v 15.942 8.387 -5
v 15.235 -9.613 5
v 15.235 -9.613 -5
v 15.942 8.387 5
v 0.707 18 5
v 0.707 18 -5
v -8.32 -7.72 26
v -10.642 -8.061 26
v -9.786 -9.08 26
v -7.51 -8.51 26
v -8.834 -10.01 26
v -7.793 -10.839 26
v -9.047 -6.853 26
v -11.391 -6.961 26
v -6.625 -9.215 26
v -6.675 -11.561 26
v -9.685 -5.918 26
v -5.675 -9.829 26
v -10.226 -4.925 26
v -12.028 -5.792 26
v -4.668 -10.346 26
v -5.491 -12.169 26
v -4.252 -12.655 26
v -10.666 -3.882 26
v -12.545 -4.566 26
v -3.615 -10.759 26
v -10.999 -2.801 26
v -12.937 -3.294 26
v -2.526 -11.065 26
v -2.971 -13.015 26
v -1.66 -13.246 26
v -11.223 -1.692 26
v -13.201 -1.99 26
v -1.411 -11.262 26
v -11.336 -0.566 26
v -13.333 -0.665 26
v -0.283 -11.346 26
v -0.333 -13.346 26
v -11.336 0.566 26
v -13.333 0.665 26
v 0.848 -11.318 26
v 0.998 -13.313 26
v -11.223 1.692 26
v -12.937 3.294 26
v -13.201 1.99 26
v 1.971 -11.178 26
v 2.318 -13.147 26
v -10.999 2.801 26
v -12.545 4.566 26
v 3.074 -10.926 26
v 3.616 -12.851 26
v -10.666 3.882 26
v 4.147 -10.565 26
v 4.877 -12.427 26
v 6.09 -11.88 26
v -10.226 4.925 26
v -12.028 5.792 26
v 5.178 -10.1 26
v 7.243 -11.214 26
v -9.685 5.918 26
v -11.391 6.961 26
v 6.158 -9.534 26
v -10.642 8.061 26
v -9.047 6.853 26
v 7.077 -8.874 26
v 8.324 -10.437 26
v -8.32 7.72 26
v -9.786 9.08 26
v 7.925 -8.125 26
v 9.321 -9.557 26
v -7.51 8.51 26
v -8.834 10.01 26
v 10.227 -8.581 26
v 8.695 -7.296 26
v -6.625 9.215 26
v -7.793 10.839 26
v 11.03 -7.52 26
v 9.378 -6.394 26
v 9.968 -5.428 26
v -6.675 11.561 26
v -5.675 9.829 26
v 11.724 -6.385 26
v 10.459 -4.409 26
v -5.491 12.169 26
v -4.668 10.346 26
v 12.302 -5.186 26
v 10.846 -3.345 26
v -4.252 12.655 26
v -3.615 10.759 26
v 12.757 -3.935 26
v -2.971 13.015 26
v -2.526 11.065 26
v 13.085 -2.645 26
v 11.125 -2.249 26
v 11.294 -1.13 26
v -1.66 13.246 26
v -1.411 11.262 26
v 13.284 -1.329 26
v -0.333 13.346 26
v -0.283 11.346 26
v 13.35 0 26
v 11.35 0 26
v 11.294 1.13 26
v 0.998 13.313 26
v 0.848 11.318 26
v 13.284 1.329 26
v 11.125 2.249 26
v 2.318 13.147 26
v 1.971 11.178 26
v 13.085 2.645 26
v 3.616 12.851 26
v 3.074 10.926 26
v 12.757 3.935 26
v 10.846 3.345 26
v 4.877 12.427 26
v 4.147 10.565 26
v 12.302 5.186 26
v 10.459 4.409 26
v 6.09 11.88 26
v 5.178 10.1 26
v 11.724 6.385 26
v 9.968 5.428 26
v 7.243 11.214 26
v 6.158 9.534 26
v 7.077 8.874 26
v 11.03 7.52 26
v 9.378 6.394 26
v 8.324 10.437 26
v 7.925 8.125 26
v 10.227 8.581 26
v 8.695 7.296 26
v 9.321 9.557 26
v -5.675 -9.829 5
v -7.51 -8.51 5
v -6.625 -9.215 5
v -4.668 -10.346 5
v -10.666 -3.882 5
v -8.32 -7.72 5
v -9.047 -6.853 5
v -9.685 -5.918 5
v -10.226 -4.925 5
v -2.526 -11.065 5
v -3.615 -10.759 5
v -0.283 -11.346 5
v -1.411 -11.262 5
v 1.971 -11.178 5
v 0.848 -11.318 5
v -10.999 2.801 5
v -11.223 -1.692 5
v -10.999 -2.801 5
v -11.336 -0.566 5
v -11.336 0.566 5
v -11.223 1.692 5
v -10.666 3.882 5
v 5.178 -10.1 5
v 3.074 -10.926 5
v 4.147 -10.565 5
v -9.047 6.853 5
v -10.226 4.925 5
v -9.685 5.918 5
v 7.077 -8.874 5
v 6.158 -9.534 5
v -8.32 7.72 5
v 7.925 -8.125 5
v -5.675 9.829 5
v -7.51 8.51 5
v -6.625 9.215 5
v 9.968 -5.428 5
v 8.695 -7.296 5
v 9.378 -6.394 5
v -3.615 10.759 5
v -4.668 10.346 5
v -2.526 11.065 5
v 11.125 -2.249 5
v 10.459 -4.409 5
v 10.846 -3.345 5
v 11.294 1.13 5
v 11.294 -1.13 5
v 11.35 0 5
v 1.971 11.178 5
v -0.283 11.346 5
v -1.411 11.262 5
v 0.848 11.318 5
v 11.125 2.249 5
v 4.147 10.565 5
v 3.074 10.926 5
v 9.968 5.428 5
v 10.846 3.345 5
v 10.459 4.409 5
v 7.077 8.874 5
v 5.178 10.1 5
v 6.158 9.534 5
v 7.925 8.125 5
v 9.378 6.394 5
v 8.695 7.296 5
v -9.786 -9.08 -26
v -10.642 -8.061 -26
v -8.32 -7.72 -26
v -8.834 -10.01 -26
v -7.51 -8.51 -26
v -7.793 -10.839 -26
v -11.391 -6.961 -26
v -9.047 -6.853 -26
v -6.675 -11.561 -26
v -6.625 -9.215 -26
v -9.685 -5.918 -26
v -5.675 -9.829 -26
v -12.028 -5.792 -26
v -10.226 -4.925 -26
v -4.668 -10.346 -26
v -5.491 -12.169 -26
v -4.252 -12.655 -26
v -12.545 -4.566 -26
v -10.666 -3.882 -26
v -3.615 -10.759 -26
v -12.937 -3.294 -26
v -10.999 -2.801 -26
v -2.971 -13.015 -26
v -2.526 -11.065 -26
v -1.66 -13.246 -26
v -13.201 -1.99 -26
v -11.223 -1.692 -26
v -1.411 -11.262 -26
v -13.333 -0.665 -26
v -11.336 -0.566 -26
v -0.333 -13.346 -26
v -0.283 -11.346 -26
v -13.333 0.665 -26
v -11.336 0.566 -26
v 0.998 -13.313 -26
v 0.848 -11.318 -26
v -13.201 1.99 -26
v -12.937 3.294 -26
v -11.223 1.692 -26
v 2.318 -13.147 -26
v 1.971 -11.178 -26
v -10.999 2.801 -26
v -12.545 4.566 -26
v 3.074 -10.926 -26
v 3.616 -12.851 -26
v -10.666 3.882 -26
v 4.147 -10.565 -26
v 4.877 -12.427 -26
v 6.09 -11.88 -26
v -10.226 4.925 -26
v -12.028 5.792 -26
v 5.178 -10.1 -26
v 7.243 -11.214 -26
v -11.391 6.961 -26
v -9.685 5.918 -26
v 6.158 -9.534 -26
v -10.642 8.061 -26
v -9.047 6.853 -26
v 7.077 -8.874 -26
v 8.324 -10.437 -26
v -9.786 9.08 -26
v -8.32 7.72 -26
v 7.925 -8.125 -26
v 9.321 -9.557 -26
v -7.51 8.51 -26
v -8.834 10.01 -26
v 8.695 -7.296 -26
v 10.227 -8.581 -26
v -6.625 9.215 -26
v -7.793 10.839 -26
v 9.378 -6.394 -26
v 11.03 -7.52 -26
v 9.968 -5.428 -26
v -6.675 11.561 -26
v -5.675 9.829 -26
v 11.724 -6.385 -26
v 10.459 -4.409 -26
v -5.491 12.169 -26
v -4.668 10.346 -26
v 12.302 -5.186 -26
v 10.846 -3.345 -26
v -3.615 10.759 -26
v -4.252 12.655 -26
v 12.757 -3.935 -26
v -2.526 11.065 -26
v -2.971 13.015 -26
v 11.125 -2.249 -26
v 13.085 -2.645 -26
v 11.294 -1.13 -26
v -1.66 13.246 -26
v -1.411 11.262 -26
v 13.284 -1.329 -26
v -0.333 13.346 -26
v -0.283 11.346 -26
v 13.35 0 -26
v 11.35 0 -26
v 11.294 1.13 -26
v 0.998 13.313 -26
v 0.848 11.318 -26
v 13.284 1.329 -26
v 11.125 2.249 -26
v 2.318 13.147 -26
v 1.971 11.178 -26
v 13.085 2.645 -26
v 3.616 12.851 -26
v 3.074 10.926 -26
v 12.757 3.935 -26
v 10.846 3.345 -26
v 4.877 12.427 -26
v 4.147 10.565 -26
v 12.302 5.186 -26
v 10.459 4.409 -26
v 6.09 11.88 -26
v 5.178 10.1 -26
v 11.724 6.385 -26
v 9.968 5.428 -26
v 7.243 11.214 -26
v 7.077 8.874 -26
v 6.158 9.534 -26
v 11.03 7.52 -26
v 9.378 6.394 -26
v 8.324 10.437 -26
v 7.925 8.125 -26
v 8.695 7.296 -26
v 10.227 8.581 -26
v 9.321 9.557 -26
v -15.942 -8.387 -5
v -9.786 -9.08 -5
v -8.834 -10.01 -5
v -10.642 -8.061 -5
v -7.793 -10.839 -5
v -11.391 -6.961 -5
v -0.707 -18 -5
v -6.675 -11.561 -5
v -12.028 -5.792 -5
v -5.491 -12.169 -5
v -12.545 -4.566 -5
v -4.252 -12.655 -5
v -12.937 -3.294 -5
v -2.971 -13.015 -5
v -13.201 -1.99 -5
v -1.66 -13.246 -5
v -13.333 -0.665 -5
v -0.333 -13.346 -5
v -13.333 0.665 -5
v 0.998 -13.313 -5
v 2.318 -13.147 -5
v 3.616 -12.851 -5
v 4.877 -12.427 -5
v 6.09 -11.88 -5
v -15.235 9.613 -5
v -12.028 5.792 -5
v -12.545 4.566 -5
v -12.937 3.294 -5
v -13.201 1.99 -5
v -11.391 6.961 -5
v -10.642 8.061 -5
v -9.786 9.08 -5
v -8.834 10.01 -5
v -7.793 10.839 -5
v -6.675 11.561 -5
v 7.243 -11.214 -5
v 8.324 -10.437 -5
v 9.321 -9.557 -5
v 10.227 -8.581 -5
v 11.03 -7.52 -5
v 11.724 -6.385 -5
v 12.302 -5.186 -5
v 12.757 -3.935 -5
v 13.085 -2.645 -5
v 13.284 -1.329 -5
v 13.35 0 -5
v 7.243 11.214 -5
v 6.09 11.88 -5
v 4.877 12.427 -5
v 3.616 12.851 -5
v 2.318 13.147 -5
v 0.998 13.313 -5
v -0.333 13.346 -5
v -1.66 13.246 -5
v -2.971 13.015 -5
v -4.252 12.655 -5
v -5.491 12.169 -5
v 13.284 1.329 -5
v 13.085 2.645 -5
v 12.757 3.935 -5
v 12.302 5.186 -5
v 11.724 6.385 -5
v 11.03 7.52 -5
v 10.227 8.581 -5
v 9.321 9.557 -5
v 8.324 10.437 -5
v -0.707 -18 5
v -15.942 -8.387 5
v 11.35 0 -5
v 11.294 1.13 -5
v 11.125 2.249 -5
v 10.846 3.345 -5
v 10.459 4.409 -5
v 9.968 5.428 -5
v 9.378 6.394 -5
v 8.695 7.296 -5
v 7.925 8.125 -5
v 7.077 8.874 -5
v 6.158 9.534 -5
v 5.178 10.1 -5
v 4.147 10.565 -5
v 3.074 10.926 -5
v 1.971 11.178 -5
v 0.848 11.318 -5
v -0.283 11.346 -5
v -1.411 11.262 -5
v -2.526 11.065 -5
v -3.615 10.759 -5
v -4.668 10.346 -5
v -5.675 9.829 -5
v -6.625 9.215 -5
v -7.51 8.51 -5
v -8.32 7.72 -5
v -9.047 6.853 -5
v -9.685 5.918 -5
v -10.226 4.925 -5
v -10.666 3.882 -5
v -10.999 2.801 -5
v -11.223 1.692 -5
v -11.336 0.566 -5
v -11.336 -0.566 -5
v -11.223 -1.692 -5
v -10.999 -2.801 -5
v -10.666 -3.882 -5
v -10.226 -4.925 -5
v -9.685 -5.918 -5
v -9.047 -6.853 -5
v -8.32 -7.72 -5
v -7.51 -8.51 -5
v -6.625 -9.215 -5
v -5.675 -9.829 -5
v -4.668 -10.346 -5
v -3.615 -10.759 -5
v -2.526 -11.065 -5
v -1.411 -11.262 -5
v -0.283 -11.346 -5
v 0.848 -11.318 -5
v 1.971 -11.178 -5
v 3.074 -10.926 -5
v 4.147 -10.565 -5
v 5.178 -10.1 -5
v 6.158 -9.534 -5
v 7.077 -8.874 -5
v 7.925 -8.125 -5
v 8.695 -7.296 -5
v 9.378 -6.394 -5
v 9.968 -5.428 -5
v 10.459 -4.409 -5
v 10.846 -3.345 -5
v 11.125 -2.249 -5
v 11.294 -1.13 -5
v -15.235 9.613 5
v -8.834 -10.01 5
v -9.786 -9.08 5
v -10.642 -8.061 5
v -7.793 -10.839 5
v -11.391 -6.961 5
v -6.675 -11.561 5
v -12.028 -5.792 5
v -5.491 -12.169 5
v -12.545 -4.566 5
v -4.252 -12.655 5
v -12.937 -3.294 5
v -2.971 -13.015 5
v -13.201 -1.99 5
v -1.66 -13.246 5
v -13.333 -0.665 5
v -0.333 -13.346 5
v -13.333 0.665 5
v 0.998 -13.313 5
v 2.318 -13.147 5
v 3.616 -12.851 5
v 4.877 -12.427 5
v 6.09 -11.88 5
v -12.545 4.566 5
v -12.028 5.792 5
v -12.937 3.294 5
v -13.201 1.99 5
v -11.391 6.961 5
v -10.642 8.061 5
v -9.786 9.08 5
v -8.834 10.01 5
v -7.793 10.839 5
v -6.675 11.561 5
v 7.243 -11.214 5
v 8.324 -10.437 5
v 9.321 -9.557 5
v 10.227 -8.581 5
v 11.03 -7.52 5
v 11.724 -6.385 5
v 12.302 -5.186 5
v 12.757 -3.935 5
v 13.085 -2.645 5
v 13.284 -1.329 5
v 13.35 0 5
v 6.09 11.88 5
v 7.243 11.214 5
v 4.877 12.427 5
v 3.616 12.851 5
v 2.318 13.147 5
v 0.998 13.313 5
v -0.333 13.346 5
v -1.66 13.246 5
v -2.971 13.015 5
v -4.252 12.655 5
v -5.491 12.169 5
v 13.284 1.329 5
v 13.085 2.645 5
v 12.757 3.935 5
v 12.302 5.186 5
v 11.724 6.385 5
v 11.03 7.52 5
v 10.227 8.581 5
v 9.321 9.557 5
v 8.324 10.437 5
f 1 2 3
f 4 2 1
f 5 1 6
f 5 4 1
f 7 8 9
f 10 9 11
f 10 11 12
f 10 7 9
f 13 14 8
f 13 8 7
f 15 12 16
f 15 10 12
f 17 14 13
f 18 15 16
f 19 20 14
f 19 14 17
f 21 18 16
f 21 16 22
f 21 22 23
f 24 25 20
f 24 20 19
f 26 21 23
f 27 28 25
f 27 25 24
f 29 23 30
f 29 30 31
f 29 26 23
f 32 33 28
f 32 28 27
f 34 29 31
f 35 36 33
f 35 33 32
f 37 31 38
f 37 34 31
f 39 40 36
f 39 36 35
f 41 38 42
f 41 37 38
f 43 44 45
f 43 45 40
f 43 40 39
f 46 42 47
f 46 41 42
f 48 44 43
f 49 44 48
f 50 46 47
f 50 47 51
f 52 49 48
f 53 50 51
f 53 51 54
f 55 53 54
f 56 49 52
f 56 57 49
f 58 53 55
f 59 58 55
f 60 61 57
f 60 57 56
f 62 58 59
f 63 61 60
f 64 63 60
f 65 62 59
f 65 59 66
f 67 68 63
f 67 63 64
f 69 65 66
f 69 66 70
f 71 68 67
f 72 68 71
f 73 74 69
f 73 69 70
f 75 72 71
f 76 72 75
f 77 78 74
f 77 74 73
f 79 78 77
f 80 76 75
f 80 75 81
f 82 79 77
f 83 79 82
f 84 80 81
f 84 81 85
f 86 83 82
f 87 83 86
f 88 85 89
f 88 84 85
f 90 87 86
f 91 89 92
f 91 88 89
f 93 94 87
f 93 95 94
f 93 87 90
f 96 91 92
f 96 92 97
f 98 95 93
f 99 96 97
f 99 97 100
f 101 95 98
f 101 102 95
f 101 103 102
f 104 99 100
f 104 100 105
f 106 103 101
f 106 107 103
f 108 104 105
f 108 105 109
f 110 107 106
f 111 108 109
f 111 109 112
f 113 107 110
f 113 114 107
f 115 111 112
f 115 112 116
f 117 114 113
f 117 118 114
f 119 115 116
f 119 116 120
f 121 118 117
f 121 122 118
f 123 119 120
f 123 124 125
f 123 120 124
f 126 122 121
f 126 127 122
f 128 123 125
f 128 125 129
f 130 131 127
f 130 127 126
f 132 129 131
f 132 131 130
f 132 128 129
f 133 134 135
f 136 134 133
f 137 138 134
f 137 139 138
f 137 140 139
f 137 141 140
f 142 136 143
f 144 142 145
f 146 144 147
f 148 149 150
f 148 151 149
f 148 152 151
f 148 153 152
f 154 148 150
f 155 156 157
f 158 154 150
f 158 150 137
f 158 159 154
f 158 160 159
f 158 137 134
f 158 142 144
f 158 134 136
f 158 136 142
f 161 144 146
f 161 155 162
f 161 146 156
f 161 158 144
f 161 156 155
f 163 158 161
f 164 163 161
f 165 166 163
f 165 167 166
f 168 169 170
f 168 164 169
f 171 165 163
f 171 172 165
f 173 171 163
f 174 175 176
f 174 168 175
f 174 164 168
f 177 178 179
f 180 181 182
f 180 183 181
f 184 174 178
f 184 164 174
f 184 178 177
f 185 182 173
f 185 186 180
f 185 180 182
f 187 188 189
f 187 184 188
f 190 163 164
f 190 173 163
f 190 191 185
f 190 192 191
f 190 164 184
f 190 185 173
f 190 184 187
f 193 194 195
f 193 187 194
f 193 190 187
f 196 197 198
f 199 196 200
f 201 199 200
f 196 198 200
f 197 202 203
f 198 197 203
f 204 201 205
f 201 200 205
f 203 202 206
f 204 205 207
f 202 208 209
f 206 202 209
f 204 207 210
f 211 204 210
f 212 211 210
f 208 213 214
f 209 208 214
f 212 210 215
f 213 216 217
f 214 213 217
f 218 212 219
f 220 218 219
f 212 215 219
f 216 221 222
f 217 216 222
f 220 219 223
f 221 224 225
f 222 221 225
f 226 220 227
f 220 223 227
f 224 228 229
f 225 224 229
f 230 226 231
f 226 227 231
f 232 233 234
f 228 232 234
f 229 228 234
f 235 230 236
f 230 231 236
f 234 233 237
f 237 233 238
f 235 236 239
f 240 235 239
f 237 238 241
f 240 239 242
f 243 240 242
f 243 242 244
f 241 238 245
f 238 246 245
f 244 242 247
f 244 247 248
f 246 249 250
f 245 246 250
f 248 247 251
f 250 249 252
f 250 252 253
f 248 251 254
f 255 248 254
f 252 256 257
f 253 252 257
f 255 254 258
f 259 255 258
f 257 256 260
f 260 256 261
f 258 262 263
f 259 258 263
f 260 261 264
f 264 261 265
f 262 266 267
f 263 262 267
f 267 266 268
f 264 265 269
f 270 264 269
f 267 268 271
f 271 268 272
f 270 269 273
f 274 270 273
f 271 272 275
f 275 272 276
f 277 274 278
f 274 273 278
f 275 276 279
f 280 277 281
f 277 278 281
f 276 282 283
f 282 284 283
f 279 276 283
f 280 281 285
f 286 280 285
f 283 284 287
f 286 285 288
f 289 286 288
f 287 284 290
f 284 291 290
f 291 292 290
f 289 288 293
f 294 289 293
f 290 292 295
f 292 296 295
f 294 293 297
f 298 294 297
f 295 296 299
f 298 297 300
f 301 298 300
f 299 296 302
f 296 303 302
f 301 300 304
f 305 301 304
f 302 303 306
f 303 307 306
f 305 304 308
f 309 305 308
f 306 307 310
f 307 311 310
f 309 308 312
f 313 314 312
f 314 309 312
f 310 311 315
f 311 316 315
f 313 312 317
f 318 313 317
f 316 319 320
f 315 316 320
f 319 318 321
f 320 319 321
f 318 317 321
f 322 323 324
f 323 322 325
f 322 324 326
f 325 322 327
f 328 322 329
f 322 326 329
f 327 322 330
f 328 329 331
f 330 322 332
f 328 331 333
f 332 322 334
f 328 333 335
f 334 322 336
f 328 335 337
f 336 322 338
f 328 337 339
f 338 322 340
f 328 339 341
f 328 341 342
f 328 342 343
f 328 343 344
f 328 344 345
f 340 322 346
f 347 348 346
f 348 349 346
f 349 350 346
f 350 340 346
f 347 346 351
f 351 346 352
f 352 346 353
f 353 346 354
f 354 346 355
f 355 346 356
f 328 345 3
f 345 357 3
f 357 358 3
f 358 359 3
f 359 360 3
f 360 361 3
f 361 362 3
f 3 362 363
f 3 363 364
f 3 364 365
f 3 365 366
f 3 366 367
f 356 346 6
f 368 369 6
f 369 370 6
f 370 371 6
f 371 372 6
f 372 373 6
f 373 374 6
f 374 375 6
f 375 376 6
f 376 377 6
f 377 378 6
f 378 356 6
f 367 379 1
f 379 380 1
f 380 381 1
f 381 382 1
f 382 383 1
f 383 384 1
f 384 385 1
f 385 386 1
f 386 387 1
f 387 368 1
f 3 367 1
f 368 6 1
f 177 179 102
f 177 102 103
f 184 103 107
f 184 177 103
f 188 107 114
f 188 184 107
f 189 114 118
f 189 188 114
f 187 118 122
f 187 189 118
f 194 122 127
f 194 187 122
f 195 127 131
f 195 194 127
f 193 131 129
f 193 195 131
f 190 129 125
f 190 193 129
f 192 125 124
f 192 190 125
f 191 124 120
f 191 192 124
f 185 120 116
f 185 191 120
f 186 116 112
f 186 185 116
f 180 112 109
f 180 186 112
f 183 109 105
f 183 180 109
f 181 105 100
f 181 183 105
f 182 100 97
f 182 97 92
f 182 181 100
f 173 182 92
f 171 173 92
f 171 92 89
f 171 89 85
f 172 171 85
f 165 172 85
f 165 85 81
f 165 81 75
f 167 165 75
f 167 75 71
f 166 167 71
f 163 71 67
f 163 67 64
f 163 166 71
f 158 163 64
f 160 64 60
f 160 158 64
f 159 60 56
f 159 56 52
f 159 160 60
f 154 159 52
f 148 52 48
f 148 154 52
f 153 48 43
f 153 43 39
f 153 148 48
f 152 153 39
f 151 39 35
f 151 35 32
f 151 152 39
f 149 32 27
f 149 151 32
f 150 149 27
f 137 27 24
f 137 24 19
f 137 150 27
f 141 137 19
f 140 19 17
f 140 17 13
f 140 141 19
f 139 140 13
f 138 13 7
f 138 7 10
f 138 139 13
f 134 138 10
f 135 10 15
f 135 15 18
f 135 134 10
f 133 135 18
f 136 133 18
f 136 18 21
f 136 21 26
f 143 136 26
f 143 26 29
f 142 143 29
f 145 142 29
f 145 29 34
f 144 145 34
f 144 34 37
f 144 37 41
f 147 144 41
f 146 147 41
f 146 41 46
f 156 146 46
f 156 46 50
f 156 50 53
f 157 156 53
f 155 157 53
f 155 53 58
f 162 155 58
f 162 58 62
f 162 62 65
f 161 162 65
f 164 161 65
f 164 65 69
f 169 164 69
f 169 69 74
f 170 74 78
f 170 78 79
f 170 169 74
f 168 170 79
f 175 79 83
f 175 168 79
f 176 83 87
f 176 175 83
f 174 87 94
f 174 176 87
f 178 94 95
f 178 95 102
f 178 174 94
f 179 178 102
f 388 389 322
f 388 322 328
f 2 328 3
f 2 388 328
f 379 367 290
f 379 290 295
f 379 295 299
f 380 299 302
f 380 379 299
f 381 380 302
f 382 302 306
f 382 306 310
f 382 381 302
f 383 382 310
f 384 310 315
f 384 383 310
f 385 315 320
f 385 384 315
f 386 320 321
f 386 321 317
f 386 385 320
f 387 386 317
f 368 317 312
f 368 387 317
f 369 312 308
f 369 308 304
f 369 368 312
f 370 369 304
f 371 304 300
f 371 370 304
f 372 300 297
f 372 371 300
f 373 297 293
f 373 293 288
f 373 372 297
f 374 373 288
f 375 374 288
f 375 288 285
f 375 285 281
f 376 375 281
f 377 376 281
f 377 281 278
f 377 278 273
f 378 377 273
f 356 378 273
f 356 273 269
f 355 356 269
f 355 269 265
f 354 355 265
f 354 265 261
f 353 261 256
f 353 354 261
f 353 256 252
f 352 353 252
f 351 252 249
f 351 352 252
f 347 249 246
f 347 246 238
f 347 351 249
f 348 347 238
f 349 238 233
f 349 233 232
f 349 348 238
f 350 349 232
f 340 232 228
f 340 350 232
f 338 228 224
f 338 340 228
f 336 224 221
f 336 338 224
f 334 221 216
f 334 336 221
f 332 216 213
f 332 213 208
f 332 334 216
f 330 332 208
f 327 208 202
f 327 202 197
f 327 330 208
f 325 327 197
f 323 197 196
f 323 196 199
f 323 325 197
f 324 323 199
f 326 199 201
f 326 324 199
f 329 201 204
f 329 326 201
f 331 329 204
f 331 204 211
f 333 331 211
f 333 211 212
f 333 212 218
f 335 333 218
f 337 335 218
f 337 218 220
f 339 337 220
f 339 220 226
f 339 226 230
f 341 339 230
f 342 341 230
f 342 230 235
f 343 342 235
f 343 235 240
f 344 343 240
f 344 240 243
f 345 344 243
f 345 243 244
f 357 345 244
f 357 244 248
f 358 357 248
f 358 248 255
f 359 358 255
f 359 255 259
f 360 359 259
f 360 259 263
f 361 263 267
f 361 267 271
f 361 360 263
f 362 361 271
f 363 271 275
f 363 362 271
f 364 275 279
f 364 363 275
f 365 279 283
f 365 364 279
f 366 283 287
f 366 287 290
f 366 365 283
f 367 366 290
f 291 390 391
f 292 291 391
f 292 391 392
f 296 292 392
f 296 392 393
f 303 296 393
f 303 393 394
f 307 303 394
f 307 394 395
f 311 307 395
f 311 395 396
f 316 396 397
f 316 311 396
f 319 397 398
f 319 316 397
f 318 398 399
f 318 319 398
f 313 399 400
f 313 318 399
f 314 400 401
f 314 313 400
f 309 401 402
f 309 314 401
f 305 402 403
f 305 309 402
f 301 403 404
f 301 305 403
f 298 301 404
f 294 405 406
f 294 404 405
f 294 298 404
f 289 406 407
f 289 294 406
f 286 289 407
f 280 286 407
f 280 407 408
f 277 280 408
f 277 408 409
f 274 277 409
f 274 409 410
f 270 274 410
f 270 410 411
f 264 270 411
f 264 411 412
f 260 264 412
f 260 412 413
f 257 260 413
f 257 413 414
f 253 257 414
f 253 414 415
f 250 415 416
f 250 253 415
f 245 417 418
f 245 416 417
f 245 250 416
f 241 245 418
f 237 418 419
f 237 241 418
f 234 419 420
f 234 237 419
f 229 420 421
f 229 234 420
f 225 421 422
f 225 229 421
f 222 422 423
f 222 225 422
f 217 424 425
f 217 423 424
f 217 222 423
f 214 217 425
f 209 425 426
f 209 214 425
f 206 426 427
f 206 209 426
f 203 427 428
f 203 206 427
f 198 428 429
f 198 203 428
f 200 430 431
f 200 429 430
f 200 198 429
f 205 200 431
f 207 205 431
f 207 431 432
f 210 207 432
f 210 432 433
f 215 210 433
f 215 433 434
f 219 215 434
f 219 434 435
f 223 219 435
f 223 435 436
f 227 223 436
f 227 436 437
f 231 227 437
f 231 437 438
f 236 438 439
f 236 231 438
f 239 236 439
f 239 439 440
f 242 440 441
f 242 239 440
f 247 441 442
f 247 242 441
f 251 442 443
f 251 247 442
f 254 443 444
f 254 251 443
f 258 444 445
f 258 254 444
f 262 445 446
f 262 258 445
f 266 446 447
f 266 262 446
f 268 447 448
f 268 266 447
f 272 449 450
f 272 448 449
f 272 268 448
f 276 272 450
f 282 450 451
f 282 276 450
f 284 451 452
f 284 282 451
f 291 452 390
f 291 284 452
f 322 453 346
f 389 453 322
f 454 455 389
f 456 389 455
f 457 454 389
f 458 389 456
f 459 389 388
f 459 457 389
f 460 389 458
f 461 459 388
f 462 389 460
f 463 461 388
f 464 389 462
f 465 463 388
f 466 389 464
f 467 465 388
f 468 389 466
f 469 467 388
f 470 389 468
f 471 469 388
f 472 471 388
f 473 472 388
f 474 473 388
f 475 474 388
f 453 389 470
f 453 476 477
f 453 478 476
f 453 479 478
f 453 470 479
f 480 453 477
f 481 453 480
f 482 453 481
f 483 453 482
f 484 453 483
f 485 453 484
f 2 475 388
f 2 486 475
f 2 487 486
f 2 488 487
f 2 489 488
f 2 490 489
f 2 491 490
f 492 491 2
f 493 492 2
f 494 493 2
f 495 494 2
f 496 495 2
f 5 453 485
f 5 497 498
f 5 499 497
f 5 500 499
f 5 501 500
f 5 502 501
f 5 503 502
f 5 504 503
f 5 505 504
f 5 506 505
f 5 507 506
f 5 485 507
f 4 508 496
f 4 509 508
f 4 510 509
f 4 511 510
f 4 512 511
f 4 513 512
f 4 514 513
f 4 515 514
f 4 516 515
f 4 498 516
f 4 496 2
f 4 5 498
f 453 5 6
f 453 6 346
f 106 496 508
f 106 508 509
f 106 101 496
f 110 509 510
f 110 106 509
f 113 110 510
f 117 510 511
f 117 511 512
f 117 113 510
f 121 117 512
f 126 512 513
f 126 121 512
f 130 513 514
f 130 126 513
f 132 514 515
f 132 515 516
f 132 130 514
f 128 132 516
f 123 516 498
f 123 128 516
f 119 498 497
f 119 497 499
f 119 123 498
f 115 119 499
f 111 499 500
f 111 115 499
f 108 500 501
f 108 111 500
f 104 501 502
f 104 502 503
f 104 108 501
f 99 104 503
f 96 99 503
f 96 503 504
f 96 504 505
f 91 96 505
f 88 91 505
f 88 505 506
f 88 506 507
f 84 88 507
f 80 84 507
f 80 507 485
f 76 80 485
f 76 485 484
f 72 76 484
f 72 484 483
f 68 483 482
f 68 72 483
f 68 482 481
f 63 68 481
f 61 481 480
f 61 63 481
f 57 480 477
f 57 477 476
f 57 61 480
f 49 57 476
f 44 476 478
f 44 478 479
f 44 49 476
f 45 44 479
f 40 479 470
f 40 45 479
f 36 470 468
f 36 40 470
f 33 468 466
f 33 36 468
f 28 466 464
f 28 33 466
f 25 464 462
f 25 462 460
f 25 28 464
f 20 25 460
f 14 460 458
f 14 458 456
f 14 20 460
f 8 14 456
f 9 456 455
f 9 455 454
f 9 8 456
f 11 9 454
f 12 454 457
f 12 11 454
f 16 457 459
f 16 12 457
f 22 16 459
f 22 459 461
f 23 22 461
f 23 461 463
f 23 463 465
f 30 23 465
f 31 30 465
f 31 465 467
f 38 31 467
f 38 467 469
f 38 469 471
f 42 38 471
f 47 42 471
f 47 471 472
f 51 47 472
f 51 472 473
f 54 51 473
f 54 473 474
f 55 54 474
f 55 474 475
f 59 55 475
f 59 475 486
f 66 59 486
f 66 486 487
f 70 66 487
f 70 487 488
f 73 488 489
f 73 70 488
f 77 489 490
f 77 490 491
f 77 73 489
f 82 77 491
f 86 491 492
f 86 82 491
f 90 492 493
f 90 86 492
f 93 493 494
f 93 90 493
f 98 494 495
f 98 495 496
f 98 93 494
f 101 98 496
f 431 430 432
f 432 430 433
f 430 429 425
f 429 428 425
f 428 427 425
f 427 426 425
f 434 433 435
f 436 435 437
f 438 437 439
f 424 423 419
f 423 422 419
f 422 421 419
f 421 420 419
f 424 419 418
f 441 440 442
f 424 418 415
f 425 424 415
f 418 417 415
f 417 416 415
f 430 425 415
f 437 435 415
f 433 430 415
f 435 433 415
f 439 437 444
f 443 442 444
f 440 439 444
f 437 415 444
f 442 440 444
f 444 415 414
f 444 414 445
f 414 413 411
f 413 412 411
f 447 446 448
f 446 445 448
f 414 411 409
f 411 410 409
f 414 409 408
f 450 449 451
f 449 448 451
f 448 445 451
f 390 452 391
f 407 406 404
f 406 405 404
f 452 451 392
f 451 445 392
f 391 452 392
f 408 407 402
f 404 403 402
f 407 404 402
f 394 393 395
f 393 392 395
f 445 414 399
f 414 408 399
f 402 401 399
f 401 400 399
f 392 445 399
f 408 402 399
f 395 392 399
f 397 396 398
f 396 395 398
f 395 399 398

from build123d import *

# Parameters (mm, degrees)
SKETCH1_R           = 13.35
SKETCH1_R_2         = 11.35
EXTRUDE_THIN1_DEPTH = 26
BOSS_EXTRUDE1_DEPTH = 5


with BuildPart() as part:
    # Sketch1 → Extrude-Thin1 (new, symmetric)
    with BuildSketch(Plane.XY):
        Circle(SKETCH1_R)
        Circle(SKETCH1_R_2, mode=Mode.SUBTRACT)
    extrude(amount=EXTRUDE_THIN1_DEPTH, both=True)

    # Sketch2 → Boss-Extrude1 (add, symmetric)
    with BuildSketch(Plane.XY):
        Polygon((15.942171509, 8.387348964), (0.707428481, 18), (-15.234743028, 9.612651036), (-15.942171509, -8.387348964), (-0.707428481, -18), (15.234743028, -9.612651036), align=None)
    extrude(amount=BOSS_EXTRUDE1_DEPTH, both=True)


solid = part.part
